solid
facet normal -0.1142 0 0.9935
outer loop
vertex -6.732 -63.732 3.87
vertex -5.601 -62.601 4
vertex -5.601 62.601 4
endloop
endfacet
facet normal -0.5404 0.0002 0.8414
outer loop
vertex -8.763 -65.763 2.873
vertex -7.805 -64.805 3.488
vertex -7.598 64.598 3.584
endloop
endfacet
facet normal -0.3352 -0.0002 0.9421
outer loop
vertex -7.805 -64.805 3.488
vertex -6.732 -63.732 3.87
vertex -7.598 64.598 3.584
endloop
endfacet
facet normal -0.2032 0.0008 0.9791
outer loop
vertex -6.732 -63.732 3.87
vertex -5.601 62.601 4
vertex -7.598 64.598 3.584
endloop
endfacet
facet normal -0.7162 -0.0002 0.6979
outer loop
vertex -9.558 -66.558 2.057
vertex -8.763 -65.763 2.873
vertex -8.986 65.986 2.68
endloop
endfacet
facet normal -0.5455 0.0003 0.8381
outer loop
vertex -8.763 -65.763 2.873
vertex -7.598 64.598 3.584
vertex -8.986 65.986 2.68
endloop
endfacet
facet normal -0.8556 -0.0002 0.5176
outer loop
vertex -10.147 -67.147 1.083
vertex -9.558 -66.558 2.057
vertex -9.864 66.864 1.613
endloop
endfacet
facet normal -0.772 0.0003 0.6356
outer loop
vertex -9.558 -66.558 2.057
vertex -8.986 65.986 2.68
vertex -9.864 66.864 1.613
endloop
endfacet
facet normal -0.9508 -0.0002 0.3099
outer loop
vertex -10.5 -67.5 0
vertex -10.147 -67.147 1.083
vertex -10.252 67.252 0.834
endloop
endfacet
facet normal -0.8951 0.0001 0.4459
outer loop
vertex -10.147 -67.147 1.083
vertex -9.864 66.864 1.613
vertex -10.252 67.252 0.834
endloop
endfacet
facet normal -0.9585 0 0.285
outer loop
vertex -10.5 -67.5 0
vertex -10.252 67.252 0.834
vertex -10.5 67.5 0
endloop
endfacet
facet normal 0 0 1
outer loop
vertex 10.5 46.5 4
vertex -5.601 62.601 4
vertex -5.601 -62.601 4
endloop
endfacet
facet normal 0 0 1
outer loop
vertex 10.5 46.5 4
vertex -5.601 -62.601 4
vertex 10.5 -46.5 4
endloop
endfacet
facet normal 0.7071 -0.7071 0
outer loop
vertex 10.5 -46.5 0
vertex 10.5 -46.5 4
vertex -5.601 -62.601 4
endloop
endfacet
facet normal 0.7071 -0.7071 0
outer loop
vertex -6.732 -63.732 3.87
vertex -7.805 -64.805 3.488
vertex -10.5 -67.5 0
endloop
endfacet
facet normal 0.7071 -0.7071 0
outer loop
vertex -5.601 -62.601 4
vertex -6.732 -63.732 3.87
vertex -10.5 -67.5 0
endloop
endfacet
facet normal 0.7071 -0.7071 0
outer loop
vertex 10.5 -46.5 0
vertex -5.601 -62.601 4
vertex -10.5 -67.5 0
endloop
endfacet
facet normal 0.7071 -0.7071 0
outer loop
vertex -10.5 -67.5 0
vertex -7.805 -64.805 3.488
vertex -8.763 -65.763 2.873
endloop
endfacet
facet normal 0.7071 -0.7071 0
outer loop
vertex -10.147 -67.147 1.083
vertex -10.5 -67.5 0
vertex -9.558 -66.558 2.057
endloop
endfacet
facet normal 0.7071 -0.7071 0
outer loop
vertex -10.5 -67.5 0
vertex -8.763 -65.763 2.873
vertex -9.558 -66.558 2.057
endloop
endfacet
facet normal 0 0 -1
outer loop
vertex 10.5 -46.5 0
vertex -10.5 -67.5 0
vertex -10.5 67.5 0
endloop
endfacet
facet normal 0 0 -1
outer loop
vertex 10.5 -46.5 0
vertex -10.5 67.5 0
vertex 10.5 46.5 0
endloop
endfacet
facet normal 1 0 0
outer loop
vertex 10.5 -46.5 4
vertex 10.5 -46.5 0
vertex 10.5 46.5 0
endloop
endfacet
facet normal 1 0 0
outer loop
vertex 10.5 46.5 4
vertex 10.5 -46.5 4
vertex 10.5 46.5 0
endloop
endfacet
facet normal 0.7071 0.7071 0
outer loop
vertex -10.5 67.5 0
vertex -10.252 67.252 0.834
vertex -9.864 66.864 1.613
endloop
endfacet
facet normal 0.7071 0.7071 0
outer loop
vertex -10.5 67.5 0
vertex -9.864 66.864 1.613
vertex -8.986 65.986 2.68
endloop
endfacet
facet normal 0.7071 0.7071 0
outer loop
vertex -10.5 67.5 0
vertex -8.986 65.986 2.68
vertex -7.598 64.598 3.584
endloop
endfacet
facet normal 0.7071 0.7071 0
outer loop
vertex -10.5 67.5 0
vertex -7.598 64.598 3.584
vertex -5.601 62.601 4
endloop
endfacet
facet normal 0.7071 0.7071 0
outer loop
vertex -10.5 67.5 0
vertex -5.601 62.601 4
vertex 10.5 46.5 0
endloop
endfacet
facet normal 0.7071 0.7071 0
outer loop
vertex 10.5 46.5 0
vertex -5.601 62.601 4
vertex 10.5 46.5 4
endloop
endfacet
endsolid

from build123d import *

# Parameters (mm, degrees)
F0_W        = 21
F0_H        = 135
F1_DEPTH    = 4
F3_DEPTH    = 4.001
F4_T1_DEPTH = 159.4948974279


# Not quite as in the source:
# - a fillet or chamfer that OpenCascade refuses, or shapes differently, is made with other operations: its cross-section is extruded or revolved along the edge and cut away or added


with BuildPart() as f1:
    # F0 (on Top) → F1 (new body)
    with BuildSketch(Plane.XY):
        Rectangle(F0_W, F0_H)
    extrude(amount=F1_DEPTH)

    # F2 (on face) → F3 (cut, through all)
    with BuildSketch(Plane.XY.offset(4)):
        Polygon((10.5, 67.5), (-10.5, 67.5), (10.5, 46.5), align=None)
        Polygon((10.5, -46.5), (-10.5, -67.5), (10.5, -67.5), align=None)
    extrude(amount=-F3_DEPTH, mode=Mode.SUBTRACT)

    # F4: fillet of radius 5 on 1 edges, made by hand

    # F4_s2 → F4_t1 (cut)
    with BuildSketch(Plane.XZ.offset(-79.7474487139)):
        with BuildLine():
            ThreePointArc((-5.6010205144, 4), (-8.7632981746, 2.8729833462), (-10.5, 0))
            Line((-10.5, 0), (-10.5, 4))
            Line((-10.5, 4), (-5.6010205144, 4))
        make_face()
    extrude(amount=F4_T1_DEPTH, mode=Mode.SUBTRACT)


solid = f1.part
